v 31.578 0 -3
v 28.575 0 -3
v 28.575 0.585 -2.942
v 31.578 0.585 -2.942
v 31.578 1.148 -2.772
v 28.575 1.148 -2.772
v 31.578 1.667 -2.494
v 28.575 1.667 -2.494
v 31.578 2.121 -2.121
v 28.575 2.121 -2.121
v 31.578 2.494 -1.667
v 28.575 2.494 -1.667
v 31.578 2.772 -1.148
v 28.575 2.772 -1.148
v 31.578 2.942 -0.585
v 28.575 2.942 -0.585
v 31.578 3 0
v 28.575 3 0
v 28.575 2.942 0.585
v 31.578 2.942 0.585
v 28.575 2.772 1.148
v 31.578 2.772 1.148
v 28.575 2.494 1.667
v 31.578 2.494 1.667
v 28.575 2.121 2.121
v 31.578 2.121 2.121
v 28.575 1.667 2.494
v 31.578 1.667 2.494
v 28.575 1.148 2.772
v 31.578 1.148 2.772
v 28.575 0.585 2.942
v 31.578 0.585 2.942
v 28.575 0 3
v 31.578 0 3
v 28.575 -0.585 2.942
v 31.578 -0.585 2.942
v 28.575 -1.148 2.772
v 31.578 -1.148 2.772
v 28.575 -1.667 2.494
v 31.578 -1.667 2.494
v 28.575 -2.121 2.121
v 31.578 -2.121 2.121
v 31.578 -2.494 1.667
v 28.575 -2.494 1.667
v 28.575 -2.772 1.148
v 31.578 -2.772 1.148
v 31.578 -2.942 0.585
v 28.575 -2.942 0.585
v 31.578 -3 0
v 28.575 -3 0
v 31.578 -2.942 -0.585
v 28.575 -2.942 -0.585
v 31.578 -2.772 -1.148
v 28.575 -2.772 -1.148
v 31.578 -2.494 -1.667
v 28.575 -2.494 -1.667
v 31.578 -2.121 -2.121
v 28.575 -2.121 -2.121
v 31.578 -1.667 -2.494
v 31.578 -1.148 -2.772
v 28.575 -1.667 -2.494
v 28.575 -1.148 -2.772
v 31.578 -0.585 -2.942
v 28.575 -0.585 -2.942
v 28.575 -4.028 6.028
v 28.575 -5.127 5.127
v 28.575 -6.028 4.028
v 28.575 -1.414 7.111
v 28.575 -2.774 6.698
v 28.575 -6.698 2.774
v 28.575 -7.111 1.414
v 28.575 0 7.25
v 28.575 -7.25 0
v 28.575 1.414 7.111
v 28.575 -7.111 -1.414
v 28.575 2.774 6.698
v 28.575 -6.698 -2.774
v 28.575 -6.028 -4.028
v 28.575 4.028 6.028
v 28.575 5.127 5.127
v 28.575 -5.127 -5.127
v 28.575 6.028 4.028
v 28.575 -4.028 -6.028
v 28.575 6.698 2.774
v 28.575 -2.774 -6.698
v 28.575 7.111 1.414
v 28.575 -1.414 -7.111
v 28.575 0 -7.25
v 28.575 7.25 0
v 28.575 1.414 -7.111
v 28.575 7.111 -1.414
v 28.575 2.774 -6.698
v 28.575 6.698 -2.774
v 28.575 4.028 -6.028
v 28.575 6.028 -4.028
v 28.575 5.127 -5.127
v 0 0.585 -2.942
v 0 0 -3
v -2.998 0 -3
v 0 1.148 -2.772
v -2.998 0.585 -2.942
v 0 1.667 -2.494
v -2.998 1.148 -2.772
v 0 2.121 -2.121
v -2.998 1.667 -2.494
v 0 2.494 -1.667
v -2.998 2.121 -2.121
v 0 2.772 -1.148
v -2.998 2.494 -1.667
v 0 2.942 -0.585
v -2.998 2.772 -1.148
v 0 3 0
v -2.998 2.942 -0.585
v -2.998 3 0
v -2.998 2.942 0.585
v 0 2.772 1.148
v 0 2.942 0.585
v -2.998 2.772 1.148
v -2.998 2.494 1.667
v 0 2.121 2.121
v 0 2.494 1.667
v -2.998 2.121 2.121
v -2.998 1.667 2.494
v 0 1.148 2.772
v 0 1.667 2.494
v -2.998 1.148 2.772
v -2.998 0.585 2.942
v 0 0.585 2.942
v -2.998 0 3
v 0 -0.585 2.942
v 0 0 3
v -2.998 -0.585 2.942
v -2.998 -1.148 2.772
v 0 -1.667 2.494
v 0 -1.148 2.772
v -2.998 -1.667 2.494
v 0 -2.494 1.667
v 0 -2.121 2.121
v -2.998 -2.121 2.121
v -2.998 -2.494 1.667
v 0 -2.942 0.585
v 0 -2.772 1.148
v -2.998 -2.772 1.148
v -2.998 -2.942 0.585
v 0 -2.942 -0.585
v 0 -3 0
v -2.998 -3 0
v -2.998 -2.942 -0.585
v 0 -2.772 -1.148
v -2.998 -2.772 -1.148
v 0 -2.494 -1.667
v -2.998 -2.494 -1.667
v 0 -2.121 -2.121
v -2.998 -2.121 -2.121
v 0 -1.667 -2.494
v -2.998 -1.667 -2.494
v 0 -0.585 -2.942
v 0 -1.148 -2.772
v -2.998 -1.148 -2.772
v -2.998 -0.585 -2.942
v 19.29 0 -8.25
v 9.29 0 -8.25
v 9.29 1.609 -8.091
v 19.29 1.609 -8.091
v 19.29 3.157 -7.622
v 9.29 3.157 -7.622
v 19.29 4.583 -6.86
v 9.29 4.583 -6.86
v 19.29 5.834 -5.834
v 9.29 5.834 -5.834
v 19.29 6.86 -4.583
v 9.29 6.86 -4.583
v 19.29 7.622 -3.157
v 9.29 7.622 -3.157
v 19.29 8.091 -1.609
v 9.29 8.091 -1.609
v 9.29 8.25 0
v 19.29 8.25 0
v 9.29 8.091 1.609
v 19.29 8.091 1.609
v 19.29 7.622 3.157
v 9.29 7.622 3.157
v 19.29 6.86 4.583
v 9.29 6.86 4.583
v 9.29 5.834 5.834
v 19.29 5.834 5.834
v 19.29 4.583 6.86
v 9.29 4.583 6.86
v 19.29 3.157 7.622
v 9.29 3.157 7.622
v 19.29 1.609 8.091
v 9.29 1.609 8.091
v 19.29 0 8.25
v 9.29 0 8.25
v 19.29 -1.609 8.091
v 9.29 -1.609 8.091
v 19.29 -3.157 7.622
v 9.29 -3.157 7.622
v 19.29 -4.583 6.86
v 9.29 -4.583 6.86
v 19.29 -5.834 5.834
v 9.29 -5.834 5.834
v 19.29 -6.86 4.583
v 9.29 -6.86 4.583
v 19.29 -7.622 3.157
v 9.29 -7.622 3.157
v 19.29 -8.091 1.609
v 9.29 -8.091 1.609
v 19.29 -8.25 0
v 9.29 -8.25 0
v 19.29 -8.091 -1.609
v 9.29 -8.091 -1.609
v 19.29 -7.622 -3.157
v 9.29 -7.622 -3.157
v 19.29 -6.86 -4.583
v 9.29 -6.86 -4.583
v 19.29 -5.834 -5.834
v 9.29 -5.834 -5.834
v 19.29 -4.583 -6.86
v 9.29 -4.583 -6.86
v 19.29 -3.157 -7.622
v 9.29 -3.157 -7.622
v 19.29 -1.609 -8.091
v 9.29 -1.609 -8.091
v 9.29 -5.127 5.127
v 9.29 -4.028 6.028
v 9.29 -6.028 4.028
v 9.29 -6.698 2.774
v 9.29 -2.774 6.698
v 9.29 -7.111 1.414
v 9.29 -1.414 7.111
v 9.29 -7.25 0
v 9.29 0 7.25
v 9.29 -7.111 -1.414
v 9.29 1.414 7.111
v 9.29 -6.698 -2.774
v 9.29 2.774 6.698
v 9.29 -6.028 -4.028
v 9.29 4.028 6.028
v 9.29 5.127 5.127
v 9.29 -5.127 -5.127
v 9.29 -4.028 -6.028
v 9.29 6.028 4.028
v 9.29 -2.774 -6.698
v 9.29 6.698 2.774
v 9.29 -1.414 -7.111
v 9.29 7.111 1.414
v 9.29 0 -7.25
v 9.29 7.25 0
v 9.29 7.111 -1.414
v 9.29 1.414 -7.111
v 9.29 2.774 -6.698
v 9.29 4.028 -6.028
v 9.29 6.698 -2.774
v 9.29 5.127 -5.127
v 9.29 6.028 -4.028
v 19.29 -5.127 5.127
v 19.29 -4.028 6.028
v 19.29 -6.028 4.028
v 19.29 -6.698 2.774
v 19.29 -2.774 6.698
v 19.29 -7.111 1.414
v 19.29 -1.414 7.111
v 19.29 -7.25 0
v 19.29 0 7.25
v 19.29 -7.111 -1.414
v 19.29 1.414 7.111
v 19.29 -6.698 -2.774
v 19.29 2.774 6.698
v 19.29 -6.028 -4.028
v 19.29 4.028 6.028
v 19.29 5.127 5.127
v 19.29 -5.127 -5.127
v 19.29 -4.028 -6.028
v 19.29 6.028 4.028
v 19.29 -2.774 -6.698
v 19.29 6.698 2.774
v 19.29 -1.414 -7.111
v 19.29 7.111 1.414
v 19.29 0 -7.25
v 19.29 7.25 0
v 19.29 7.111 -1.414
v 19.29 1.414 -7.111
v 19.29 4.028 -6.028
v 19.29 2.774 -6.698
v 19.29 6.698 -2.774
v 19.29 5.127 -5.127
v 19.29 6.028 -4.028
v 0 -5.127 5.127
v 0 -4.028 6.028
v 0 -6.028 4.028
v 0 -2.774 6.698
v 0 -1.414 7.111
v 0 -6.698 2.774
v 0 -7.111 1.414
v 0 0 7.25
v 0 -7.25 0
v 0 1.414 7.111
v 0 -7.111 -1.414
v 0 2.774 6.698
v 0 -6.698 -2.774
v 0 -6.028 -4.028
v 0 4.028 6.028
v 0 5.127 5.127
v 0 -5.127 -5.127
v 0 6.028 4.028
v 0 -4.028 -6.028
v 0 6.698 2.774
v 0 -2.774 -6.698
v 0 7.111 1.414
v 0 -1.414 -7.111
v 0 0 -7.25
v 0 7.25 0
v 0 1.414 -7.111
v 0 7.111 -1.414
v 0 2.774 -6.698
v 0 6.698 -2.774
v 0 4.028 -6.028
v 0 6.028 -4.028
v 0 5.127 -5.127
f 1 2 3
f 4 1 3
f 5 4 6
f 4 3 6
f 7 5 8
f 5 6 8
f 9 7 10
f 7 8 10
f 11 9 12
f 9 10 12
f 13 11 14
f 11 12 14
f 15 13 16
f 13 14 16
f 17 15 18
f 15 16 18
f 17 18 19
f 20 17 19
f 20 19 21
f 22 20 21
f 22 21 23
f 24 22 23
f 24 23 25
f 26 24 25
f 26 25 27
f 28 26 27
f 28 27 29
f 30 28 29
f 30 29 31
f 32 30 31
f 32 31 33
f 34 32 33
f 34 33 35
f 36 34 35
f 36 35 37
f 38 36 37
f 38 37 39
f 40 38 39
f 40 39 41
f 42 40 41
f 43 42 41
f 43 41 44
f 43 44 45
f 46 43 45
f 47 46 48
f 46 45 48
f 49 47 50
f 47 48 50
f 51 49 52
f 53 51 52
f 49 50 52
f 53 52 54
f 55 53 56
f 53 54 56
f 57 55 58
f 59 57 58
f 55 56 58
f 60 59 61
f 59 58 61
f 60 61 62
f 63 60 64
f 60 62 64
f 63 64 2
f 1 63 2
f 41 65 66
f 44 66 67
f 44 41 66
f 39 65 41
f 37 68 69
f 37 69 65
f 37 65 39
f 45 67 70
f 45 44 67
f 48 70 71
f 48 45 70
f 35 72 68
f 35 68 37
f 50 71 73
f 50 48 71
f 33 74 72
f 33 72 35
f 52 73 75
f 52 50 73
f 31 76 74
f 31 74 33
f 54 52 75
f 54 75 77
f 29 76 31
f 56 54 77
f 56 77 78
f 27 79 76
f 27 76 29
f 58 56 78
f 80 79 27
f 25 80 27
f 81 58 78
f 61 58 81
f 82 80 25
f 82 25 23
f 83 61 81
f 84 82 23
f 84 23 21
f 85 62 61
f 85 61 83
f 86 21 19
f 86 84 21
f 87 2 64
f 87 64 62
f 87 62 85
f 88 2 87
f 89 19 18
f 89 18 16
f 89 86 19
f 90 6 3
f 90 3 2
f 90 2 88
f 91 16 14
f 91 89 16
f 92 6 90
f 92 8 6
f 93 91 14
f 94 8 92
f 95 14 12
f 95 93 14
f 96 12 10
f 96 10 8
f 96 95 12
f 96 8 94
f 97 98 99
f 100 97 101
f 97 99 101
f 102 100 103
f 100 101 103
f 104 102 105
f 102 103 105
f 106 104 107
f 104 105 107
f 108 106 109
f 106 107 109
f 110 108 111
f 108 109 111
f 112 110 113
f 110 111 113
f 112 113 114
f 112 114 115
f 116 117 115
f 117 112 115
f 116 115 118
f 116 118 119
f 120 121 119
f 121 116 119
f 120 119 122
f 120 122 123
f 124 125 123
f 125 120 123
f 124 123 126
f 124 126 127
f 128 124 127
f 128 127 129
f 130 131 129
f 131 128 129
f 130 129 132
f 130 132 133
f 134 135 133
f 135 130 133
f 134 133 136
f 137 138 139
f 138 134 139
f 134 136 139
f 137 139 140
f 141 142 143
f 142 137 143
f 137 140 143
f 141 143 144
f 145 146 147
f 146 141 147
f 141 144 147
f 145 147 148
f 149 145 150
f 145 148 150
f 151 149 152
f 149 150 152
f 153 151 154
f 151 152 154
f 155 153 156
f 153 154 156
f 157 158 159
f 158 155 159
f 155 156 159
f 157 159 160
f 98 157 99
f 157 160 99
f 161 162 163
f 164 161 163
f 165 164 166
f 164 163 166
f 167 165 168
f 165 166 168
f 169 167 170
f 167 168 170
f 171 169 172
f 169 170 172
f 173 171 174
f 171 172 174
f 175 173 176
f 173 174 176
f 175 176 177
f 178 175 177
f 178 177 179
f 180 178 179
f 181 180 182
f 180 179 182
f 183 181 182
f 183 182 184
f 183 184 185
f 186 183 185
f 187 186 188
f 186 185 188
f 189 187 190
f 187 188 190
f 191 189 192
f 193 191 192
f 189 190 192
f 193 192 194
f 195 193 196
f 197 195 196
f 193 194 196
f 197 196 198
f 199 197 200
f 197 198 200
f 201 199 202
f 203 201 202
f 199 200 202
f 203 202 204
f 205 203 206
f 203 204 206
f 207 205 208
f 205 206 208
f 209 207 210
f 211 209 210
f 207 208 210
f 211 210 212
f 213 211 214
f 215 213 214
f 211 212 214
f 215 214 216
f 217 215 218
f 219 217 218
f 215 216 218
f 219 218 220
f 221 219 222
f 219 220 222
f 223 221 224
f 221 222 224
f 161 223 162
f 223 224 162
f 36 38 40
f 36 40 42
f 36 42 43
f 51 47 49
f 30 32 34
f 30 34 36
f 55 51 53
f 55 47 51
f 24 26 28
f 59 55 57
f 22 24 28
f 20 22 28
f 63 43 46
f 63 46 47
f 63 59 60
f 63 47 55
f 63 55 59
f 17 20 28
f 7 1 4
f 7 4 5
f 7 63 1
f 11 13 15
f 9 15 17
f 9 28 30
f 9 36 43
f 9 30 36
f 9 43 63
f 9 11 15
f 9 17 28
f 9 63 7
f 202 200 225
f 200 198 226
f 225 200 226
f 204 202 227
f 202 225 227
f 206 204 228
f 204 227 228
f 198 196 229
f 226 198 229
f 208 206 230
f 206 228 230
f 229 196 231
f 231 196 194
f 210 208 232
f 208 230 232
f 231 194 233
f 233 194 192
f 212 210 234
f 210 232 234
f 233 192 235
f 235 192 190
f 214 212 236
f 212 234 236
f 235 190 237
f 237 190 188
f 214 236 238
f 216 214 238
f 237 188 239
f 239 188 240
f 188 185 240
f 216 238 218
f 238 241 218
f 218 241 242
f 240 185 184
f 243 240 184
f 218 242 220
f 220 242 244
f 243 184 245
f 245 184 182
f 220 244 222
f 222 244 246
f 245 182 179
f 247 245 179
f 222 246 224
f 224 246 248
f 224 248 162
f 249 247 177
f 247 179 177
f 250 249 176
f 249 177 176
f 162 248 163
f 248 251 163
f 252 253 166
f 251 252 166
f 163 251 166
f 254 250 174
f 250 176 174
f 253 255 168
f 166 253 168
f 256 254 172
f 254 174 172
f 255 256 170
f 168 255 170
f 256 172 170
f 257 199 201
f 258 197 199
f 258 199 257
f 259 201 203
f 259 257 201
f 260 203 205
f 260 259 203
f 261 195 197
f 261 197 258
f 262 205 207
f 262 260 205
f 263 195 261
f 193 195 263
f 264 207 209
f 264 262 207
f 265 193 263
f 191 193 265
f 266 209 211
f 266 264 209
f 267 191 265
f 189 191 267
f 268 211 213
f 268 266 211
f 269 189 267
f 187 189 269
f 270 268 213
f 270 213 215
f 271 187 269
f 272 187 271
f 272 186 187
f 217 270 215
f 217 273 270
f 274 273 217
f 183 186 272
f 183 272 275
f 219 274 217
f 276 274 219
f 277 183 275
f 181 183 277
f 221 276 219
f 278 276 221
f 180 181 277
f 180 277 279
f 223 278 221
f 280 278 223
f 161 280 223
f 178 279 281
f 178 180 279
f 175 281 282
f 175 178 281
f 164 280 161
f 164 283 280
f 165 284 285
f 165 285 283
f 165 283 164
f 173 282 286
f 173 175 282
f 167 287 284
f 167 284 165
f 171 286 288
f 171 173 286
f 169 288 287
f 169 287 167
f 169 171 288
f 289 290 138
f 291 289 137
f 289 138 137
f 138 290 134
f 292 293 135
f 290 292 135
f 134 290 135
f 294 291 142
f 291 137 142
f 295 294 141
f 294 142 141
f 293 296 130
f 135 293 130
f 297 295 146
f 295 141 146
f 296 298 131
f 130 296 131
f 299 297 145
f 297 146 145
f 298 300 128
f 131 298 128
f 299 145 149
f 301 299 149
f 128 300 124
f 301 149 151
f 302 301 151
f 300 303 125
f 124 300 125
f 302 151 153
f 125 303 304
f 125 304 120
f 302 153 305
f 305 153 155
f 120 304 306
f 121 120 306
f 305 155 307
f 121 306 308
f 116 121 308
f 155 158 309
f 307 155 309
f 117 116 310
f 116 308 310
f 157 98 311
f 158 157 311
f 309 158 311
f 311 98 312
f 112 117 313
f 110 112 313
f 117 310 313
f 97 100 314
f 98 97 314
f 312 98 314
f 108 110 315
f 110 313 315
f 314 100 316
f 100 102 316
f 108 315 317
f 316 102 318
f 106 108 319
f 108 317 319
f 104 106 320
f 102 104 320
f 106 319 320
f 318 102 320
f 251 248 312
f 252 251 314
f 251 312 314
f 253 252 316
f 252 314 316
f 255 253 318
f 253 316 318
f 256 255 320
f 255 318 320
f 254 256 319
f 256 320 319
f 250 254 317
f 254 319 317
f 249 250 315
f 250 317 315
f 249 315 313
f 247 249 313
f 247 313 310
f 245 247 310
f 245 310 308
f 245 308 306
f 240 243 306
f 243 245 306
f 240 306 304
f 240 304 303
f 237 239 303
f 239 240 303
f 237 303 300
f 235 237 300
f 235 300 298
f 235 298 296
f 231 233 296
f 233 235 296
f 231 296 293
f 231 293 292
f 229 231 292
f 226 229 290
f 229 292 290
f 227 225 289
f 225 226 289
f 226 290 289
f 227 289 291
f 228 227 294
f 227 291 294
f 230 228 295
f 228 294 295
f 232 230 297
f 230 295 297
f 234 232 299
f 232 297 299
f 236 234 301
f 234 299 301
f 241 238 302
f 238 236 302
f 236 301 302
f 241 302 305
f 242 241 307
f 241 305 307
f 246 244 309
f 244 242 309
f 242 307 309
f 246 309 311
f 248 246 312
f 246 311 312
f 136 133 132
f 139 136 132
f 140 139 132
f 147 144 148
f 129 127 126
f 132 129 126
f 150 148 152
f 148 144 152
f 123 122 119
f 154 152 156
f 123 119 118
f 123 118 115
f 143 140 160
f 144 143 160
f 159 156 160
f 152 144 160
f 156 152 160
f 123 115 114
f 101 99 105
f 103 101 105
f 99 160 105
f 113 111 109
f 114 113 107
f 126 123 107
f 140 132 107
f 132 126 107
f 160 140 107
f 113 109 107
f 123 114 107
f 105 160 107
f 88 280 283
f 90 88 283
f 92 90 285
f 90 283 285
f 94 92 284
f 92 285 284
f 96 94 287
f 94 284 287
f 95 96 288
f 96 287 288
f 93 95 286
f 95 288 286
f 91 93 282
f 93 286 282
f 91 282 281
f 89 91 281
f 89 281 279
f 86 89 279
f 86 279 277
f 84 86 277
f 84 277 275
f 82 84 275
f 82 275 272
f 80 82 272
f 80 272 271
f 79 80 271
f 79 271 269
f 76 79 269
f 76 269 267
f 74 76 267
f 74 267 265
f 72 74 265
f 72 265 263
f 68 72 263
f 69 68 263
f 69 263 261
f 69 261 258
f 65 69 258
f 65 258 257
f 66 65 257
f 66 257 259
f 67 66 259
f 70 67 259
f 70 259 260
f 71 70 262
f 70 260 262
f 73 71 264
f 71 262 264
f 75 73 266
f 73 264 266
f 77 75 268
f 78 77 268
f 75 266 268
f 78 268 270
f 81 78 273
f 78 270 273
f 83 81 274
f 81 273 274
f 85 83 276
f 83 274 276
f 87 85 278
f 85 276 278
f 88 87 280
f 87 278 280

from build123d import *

# Parameters (mm, degrees)
COILBASE_R                     = 7.25
BOSS_EXTRUDE1_DEPTH            = 28.575
WIREHOUSING_EXTRUDE_DEPTH      = 5
WIREHOUSING_EXTRUDE_DEPTH_BACK = 5
WIREHOUSING_R                  = 8.25
BOSS_EXTRUDE3_DEPTH            = 17.2875
BOSS_EXTRUDE3_DEPTH_BACK       = 17.2875
CLEARANCEFORACTUATOR_R         = 3


with BuildPart() as part:
    # CoilBase → Boss-Extrude1 (new body)
    with BuildSketch(Plane(origin=(0, 0, 0), x_dir=(0, 0, -1), z_dir=(1, 0, 0))):
        Circle(COILBASE_R)
    extrude(amount=BOSS_EXTRUDE1_DEPTH)

    # WireHousing → WireHousing-Extrude (add, two sides: drawn at the far end of the back side and taken through both)
    with BuildSketch(Plane(origin=(14.29, 0, 0), x_dir=(0, 0, -1), z_dir=(1, 0, 0)).offset(-WIREHOUSING_EXTRUDE_DEPTH_BACK)):
        Circle(WIREHOUSING_R)
    extrude(amount=WIREHOUSING_EXTRUDE_DEPTH + WIREHOUSING_EXTRUDE_DEPTH_BACK)

    # ClearanceForActuator → Boss-Extrude3 (add, two sides: drawn at the far end of the back side and taken through both)
    with BuildSketch(Plane(origin=(14.29, 0, 0), x_dir=(0, 0, -1), z_dir=(1, 0, 0)).offset(-BOSS_EXTRUDE3_DEPTH_BACK)):
        Circle(CLEARANCEFORACTUATOR_R)
    extrude(amount=BOSS_EXTRUDE3_DEPTH + BOSS_EXTRUDE3_DEPTH_BACK)


solid = part.part
